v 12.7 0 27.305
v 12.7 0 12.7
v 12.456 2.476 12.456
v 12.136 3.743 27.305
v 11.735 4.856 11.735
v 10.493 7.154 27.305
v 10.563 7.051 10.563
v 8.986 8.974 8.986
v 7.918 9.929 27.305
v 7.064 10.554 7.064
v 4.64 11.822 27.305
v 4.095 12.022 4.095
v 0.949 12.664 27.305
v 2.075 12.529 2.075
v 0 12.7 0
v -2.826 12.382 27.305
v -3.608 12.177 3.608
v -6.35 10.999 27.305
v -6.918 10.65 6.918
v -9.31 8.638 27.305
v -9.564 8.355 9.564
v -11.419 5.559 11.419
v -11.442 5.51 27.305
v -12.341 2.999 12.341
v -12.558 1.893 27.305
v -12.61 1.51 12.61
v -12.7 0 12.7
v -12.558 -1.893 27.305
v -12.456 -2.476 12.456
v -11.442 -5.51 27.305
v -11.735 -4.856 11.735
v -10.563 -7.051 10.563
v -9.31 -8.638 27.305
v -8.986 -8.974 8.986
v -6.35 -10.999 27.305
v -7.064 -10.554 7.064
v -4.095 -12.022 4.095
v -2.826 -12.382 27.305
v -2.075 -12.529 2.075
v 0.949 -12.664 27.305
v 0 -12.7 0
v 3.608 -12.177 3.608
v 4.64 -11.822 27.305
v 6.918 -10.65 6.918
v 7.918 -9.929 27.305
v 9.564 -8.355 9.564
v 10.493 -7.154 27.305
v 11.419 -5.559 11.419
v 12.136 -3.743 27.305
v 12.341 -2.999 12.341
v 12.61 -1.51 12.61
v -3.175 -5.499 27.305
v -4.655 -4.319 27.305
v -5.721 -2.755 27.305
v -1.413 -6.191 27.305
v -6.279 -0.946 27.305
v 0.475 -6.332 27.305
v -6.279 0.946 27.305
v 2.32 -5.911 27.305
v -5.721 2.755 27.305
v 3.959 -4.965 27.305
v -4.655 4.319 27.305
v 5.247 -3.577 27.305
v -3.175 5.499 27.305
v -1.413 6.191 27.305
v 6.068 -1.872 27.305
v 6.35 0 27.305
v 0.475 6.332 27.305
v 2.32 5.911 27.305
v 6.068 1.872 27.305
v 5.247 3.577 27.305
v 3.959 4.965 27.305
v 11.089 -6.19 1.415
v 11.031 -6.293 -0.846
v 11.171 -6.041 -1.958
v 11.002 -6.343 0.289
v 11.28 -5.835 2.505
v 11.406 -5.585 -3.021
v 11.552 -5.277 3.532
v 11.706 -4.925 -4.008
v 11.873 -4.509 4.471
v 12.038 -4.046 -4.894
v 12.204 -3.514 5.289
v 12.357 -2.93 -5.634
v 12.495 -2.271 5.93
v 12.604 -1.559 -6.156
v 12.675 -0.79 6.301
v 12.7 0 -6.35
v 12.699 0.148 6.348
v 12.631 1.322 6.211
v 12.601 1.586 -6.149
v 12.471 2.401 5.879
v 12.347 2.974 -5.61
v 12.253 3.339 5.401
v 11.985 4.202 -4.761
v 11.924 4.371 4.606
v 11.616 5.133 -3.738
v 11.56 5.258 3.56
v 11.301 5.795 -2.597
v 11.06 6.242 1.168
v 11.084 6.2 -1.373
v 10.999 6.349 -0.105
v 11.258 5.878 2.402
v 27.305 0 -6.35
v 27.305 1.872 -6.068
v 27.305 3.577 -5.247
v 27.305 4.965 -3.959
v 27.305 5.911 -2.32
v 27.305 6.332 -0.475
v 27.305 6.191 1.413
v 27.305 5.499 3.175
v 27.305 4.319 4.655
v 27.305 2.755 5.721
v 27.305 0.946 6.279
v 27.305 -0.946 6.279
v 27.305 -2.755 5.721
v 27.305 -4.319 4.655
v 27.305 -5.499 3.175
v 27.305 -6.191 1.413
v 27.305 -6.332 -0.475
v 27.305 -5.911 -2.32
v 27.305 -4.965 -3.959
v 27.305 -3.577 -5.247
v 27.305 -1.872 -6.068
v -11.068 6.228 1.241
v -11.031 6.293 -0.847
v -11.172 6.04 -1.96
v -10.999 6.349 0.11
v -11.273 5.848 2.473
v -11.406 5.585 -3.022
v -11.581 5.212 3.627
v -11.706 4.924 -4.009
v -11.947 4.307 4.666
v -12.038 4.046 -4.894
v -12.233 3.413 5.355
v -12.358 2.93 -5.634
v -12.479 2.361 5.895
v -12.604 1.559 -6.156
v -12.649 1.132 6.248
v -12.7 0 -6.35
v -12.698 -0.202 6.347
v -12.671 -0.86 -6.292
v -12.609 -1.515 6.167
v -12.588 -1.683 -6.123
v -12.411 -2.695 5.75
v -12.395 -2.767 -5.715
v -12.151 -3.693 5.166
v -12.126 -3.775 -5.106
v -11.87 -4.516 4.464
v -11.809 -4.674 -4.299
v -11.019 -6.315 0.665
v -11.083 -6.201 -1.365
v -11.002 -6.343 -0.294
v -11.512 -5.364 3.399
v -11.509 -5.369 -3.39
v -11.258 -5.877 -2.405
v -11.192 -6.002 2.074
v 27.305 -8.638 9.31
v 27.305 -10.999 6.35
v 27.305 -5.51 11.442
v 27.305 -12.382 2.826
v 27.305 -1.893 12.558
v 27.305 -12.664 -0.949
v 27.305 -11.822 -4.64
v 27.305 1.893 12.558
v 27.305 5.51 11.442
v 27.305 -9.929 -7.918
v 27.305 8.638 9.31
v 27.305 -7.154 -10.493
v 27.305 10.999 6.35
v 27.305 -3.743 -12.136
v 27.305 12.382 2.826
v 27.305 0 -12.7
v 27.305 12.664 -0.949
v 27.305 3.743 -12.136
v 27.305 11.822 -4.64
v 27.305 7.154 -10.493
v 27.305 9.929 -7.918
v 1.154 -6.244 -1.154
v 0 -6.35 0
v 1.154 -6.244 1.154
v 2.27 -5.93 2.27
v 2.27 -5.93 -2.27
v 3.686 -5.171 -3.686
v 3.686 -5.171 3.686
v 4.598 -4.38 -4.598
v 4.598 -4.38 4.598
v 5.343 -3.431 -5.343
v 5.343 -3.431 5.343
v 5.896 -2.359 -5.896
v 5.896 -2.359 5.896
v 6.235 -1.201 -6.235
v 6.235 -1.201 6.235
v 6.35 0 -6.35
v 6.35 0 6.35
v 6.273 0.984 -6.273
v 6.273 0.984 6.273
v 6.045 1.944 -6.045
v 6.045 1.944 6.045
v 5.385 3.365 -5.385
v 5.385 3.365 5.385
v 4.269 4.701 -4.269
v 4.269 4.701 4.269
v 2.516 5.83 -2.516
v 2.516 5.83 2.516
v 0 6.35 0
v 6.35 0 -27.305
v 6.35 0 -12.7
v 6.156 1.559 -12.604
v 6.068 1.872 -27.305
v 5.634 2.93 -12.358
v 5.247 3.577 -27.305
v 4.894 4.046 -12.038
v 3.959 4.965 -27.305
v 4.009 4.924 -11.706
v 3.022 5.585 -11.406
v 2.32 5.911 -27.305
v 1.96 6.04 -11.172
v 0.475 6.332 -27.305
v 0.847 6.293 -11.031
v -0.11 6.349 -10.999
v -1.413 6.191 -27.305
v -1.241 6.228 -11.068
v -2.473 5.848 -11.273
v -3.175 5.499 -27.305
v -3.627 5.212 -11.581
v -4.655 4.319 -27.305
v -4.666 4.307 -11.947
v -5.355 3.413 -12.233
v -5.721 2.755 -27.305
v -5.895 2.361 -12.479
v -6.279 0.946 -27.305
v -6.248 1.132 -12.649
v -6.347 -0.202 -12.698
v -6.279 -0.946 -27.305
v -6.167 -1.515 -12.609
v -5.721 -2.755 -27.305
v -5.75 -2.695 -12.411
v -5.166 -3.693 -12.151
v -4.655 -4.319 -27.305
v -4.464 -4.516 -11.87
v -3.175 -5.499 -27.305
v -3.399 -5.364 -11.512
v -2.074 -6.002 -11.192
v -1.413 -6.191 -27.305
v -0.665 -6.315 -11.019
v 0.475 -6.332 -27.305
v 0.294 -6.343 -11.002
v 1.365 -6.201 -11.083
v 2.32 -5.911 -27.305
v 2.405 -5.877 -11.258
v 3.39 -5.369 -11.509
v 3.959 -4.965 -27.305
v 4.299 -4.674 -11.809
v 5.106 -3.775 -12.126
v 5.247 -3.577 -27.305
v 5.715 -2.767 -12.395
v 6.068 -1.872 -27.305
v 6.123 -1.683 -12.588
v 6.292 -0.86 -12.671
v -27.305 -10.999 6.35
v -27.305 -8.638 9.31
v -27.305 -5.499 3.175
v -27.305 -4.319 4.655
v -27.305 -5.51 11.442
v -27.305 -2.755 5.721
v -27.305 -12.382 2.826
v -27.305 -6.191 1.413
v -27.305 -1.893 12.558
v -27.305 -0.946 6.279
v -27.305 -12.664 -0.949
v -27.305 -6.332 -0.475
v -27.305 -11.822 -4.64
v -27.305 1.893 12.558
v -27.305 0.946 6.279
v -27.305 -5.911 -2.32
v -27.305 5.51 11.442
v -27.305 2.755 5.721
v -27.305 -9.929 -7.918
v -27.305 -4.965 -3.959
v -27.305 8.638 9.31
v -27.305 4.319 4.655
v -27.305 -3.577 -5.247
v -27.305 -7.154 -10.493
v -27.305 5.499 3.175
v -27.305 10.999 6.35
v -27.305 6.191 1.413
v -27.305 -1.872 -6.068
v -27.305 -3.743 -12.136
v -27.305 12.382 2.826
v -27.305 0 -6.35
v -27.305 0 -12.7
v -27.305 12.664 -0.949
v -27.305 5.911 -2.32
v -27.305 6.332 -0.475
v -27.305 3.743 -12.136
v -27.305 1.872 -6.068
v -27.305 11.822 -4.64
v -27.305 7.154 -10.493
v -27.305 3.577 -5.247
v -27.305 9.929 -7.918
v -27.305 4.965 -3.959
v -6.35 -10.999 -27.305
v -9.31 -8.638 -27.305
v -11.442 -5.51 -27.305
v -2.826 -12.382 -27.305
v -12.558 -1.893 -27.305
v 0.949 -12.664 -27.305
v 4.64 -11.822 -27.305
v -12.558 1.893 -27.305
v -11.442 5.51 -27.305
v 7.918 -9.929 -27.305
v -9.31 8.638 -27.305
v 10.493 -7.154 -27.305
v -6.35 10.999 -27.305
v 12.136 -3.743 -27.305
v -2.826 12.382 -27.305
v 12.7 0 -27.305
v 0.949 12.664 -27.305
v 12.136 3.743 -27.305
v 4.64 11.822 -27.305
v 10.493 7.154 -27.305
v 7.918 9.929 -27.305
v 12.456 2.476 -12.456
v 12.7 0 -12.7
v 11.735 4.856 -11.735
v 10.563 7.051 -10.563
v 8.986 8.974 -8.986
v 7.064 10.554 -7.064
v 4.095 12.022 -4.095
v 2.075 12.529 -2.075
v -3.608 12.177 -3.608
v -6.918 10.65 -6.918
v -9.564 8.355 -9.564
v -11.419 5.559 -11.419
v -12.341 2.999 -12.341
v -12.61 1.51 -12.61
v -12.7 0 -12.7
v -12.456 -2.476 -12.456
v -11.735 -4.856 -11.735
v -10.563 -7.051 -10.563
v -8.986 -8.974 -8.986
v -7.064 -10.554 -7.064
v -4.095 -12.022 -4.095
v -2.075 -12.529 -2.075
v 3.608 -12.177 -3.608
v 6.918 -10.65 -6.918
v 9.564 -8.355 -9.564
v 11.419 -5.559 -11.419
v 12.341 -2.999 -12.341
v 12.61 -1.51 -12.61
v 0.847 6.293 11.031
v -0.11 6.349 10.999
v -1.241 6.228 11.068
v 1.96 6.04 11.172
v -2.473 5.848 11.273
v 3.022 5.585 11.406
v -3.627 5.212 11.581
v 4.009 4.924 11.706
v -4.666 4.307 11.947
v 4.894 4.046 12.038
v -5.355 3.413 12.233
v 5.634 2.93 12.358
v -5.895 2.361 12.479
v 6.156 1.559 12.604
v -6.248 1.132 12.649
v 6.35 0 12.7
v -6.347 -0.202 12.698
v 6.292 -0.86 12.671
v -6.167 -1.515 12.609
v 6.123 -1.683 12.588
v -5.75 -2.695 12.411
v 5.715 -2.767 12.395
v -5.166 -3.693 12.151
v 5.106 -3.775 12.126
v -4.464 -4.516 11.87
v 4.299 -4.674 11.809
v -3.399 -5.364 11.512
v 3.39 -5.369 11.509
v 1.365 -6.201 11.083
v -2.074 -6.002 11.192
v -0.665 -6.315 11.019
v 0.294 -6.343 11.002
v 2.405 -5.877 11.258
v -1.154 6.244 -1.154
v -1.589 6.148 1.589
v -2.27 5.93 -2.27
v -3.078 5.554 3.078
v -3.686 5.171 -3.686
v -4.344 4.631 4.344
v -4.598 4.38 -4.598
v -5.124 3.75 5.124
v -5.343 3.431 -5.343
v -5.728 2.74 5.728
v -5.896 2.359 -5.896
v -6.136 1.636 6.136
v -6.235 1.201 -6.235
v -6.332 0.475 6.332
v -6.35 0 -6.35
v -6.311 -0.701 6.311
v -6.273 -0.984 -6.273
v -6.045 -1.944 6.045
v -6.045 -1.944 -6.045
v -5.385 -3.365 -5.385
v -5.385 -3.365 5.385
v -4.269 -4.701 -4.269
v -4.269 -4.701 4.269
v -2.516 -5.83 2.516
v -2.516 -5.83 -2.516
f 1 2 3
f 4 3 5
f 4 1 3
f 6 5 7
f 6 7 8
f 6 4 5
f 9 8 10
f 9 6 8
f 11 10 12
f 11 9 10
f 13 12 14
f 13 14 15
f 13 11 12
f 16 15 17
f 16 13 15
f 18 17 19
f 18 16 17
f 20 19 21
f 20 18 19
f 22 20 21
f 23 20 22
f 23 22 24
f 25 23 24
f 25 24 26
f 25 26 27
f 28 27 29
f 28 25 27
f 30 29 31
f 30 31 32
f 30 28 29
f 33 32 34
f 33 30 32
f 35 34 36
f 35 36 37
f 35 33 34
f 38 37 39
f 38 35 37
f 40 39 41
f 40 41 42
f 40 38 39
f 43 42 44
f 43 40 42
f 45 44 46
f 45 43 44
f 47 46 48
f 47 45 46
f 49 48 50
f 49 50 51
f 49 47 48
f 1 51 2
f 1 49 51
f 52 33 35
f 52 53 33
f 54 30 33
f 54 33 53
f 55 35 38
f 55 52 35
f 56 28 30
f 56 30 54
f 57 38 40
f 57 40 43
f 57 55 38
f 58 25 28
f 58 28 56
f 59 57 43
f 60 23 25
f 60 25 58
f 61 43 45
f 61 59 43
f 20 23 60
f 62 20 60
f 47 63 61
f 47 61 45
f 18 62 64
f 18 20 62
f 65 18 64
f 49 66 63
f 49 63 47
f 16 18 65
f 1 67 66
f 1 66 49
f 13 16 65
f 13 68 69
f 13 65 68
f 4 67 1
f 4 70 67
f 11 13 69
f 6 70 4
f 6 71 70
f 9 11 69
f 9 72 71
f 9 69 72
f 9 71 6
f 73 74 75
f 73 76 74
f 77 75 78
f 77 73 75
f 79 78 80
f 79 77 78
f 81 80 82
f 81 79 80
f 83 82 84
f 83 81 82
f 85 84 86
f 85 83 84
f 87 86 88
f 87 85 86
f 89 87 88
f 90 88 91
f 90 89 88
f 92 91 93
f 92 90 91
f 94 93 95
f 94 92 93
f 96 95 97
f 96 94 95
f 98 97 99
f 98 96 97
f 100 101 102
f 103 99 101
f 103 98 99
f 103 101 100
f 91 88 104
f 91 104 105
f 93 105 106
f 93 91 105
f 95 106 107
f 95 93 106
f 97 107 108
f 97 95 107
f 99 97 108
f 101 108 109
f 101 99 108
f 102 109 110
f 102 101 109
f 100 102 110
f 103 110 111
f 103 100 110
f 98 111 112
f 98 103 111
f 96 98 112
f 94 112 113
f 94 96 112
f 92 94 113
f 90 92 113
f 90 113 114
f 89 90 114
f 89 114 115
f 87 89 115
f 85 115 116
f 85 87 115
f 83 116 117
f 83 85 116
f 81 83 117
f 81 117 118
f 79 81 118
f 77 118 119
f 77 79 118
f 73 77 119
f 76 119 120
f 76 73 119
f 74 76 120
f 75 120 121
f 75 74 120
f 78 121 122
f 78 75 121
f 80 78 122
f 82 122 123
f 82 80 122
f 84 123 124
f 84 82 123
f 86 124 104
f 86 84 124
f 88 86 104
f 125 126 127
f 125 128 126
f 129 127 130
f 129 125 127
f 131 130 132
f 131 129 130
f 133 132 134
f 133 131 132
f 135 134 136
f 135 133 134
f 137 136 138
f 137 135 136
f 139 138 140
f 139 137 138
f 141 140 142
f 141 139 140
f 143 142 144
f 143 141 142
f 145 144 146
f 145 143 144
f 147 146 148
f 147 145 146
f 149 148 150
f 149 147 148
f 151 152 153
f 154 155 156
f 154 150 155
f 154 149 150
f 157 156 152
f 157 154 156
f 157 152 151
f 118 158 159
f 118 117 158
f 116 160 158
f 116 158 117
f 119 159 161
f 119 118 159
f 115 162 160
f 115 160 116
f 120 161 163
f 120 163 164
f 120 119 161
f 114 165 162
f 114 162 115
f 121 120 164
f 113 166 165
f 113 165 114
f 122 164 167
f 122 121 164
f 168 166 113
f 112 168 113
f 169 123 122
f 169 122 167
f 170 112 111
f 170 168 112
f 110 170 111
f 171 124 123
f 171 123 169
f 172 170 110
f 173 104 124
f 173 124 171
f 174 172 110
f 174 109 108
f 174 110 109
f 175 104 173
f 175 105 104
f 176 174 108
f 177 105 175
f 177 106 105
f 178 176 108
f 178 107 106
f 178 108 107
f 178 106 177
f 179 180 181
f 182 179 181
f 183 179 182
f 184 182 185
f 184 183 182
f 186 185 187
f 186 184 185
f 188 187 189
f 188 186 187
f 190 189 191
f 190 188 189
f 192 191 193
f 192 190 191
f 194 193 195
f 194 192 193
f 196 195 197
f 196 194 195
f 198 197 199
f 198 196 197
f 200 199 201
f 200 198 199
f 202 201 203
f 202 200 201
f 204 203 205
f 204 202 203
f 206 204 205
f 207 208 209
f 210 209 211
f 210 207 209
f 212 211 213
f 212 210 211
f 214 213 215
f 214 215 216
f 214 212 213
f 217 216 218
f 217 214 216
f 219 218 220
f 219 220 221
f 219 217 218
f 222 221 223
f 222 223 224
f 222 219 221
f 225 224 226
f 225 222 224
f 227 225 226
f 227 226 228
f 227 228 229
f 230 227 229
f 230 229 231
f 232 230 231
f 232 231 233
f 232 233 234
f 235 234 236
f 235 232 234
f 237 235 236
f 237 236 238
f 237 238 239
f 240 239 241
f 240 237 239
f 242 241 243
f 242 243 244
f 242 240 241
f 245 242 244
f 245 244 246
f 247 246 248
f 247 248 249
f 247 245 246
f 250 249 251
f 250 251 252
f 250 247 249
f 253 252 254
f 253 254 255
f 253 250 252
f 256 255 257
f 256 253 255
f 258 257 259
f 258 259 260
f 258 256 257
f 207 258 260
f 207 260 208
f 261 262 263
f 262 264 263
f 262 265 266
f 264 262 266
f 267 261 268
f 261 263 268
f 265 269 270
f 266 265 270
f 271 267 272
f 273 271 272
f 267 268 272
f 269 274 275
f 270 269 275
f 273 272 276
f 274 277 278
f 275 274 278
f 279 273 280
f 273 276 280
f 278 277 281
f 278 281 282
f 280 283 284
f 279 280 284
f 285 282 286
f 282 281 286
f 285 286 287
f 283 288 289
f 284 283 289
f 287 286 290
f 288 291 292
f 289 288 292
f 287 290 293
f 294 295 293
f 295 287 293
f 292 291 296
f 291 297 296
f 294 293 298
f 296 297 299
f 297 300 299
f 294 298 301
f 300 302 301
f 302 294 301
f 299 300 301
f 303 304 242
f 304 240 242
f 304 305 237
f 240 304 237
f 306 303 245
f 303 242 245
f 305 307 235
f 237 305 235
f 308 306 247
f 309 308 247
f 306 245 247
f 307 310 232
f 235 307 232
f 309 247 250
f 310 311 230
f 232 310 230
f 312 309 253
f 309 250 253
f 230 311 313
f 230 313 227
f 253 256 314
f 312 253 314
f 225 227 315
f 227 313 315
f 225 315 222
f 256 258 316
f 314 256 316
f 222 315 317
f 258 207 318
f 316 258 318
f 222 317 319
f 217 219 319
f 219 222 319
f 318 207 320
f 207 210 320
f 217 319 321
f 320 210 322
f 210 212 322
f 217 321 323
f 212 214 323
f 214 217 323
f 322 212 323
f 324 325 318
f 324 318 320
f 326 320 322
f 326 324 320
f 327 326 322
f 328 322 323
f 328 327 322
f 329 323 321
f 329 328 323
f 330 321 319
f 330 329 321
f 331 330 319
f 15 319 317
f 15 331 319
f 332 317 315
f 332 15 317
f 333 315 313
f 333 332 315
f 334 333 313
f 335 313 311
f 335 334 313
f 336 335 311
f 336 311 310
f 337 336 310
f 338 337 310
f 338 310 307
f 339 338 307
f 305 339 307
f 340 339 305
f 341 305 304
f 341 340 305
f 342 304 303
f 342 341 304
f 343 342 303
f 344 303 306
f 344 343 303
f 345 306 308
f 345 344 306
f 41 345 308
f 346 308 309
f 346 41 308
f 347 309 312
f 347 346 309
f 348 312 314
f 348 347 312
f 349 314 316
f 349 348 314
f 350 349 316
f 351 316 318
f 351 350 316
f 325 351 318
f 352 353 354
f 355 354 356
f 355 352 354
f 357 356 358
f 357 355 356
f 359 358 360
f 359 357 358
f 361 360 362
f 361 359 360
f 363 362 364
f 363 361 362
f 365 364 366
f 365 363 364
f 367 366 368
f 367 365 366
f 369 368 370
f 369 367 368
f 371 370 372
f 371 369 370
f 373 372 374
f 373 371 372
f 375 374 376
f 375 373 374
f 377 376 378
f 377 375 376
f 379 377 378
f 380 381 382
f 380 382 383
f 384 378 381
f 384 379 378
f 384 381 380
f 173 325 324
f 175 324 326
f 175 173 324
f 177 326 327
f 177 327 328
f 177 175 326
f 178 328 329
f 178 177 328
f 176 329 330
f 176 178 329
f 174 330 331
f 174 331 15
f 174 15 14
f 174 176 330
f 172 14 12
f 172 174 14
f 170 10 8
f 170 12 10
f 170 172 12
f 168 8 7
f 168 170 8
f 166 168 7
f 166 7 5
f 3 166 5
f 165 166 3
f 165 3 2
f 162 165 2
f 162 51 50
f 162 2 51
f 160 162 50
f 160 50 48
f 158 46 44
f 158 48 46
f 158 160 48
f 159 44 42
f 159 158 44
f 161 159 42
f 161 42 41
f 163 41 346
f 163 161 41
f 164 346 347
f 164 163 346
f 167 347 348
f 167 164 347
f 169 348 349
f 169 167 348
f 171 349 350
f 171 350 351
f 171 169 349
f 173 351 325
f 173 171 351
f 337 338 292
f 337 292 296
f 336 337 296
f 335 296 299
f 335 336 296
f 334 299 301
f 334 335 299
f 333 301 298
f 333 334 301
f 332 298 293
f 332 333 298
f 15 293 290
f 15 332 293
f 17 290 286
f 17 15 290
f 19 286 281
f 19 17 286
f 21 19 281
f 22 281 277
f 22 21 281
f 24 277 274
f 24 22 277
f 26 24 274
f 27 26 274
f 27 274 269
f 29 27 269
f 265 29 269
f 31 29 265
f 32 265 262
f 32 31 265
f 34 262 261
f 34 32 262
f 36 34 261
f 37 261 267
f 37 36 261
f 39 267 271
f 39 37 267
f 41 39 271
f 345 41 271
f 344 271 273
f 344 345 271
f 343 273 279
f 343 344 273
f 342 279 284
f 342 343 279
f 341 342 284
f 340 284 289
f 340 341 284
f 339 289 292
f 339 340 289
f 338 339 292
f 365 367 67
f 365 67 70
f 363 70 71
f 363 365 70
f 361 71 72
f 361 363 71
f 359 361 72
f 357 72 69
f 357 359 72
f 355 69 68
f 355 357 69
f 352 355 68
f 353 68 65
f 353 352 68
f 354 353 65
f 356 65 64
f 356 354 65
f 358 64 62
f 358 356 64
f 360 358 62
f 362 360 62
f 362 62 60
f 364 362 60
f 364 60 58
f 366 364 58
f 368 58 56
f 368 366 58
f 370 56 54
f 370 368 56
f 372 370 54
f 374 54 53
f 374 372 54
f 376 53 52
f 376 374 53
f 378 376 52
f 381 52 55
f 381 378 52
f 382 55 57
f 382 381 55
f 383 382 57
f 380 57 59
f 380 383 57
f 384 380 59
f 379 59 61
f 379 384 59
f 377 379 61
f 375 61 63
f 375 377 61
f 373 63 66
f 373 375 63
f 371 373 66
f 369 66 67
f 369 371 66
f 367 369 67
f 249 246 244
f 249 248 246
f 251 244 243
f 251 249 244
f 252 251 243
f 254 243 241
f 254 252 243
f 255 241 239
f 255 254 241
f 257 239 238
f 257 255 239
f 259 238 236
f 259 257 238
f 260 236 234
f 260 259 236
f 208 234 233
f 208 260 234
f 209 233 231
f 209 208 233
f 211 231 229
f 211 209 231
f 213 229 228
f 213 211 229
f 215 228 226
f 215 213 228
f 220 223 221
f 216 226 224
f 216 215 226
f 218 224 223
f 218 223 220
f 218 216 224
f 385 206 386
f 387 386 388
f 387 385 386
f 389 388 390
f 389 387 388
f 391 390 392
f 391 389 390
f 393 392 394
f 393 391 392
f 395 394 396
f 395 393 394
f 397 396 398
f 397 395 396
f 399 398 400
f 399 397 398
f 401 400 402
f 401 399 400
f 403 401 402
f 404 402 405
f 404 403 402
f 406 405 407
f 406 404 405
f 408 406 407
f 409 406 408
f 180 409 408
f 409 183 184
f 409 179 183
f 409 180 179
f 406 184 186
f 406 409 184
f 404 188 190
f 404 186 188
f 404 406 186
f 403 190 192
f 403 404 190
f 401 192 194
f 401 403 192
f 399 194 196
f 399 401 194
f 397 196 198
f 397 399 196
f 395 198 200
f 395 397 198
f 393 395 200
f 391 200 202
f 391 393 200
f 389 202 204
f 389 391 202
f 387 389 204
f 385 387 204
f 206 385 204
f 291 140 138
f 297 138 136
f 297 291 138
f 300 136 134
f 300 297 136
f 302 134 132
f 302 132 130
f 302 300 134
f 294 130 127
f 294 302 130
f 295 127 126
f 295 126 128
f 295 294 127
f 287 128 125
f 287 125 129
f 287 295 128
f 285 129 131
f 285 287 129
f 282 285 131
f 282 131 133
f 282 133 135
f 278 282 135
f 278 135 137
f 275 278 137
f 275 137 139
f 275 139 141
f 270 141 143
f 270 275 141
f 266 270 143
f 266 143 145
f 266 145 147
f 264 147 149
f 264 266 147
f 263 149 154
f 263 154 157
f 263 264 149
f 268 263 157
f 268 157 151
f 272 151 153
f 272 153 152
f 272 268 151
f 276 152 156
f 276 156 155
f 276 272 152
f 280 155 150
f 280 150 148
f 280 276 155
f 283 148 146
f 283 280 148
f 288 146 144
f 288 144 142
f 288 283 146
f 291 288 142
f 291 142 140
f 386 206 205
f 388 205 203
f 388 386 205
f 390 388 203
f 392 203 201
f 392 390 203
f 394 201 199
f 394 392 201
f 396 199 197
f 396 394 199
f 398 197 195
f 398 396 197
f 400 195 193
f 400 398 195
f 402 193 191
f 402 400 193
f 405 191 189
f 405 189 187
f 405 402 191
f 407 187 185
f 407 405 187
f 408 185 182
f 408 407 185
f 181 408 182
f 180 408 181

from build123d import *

# Parameters (mm, degrees)
SKETCH1_R           = 12.7
SKETCH1_R_2         = 6.35
BOSS_EXTRUDE3_DEPTH = 27.305
SKETCH2_R           = 12.7
SKETCH2_R_2         = 6.35
BOSS_EXTRUDE4_DEPTH = 27.305


with BuildPart() as part:
    # Sketch1 → Boss-Extrude3 (new body, symmetric)
    with BuildSketch(Plane.XY):
        Circle(SKETCH1_R)
        Circle(SKETCH1_R_2, mode=Mode.SUBTRACT)
    extrude(amount=BOSS_EXTRUDE3_DEPTH, both=True)

    # Sketch2 → Boss-Extrude4 (add, symmetric)
    with BuildSketch(Plane(origin=(0, 0, 0), x_dir=(0, 0, -1), z_dir=(1, 0, 0))):
        Circle(SKETCH2_R)
        Circle(SKETCH2_R_2, mode=Mode.SUBTRACT)
    extrude(amount=BOSS_EXTRUDE4_DEPTH, both=True)


solid = part.part
